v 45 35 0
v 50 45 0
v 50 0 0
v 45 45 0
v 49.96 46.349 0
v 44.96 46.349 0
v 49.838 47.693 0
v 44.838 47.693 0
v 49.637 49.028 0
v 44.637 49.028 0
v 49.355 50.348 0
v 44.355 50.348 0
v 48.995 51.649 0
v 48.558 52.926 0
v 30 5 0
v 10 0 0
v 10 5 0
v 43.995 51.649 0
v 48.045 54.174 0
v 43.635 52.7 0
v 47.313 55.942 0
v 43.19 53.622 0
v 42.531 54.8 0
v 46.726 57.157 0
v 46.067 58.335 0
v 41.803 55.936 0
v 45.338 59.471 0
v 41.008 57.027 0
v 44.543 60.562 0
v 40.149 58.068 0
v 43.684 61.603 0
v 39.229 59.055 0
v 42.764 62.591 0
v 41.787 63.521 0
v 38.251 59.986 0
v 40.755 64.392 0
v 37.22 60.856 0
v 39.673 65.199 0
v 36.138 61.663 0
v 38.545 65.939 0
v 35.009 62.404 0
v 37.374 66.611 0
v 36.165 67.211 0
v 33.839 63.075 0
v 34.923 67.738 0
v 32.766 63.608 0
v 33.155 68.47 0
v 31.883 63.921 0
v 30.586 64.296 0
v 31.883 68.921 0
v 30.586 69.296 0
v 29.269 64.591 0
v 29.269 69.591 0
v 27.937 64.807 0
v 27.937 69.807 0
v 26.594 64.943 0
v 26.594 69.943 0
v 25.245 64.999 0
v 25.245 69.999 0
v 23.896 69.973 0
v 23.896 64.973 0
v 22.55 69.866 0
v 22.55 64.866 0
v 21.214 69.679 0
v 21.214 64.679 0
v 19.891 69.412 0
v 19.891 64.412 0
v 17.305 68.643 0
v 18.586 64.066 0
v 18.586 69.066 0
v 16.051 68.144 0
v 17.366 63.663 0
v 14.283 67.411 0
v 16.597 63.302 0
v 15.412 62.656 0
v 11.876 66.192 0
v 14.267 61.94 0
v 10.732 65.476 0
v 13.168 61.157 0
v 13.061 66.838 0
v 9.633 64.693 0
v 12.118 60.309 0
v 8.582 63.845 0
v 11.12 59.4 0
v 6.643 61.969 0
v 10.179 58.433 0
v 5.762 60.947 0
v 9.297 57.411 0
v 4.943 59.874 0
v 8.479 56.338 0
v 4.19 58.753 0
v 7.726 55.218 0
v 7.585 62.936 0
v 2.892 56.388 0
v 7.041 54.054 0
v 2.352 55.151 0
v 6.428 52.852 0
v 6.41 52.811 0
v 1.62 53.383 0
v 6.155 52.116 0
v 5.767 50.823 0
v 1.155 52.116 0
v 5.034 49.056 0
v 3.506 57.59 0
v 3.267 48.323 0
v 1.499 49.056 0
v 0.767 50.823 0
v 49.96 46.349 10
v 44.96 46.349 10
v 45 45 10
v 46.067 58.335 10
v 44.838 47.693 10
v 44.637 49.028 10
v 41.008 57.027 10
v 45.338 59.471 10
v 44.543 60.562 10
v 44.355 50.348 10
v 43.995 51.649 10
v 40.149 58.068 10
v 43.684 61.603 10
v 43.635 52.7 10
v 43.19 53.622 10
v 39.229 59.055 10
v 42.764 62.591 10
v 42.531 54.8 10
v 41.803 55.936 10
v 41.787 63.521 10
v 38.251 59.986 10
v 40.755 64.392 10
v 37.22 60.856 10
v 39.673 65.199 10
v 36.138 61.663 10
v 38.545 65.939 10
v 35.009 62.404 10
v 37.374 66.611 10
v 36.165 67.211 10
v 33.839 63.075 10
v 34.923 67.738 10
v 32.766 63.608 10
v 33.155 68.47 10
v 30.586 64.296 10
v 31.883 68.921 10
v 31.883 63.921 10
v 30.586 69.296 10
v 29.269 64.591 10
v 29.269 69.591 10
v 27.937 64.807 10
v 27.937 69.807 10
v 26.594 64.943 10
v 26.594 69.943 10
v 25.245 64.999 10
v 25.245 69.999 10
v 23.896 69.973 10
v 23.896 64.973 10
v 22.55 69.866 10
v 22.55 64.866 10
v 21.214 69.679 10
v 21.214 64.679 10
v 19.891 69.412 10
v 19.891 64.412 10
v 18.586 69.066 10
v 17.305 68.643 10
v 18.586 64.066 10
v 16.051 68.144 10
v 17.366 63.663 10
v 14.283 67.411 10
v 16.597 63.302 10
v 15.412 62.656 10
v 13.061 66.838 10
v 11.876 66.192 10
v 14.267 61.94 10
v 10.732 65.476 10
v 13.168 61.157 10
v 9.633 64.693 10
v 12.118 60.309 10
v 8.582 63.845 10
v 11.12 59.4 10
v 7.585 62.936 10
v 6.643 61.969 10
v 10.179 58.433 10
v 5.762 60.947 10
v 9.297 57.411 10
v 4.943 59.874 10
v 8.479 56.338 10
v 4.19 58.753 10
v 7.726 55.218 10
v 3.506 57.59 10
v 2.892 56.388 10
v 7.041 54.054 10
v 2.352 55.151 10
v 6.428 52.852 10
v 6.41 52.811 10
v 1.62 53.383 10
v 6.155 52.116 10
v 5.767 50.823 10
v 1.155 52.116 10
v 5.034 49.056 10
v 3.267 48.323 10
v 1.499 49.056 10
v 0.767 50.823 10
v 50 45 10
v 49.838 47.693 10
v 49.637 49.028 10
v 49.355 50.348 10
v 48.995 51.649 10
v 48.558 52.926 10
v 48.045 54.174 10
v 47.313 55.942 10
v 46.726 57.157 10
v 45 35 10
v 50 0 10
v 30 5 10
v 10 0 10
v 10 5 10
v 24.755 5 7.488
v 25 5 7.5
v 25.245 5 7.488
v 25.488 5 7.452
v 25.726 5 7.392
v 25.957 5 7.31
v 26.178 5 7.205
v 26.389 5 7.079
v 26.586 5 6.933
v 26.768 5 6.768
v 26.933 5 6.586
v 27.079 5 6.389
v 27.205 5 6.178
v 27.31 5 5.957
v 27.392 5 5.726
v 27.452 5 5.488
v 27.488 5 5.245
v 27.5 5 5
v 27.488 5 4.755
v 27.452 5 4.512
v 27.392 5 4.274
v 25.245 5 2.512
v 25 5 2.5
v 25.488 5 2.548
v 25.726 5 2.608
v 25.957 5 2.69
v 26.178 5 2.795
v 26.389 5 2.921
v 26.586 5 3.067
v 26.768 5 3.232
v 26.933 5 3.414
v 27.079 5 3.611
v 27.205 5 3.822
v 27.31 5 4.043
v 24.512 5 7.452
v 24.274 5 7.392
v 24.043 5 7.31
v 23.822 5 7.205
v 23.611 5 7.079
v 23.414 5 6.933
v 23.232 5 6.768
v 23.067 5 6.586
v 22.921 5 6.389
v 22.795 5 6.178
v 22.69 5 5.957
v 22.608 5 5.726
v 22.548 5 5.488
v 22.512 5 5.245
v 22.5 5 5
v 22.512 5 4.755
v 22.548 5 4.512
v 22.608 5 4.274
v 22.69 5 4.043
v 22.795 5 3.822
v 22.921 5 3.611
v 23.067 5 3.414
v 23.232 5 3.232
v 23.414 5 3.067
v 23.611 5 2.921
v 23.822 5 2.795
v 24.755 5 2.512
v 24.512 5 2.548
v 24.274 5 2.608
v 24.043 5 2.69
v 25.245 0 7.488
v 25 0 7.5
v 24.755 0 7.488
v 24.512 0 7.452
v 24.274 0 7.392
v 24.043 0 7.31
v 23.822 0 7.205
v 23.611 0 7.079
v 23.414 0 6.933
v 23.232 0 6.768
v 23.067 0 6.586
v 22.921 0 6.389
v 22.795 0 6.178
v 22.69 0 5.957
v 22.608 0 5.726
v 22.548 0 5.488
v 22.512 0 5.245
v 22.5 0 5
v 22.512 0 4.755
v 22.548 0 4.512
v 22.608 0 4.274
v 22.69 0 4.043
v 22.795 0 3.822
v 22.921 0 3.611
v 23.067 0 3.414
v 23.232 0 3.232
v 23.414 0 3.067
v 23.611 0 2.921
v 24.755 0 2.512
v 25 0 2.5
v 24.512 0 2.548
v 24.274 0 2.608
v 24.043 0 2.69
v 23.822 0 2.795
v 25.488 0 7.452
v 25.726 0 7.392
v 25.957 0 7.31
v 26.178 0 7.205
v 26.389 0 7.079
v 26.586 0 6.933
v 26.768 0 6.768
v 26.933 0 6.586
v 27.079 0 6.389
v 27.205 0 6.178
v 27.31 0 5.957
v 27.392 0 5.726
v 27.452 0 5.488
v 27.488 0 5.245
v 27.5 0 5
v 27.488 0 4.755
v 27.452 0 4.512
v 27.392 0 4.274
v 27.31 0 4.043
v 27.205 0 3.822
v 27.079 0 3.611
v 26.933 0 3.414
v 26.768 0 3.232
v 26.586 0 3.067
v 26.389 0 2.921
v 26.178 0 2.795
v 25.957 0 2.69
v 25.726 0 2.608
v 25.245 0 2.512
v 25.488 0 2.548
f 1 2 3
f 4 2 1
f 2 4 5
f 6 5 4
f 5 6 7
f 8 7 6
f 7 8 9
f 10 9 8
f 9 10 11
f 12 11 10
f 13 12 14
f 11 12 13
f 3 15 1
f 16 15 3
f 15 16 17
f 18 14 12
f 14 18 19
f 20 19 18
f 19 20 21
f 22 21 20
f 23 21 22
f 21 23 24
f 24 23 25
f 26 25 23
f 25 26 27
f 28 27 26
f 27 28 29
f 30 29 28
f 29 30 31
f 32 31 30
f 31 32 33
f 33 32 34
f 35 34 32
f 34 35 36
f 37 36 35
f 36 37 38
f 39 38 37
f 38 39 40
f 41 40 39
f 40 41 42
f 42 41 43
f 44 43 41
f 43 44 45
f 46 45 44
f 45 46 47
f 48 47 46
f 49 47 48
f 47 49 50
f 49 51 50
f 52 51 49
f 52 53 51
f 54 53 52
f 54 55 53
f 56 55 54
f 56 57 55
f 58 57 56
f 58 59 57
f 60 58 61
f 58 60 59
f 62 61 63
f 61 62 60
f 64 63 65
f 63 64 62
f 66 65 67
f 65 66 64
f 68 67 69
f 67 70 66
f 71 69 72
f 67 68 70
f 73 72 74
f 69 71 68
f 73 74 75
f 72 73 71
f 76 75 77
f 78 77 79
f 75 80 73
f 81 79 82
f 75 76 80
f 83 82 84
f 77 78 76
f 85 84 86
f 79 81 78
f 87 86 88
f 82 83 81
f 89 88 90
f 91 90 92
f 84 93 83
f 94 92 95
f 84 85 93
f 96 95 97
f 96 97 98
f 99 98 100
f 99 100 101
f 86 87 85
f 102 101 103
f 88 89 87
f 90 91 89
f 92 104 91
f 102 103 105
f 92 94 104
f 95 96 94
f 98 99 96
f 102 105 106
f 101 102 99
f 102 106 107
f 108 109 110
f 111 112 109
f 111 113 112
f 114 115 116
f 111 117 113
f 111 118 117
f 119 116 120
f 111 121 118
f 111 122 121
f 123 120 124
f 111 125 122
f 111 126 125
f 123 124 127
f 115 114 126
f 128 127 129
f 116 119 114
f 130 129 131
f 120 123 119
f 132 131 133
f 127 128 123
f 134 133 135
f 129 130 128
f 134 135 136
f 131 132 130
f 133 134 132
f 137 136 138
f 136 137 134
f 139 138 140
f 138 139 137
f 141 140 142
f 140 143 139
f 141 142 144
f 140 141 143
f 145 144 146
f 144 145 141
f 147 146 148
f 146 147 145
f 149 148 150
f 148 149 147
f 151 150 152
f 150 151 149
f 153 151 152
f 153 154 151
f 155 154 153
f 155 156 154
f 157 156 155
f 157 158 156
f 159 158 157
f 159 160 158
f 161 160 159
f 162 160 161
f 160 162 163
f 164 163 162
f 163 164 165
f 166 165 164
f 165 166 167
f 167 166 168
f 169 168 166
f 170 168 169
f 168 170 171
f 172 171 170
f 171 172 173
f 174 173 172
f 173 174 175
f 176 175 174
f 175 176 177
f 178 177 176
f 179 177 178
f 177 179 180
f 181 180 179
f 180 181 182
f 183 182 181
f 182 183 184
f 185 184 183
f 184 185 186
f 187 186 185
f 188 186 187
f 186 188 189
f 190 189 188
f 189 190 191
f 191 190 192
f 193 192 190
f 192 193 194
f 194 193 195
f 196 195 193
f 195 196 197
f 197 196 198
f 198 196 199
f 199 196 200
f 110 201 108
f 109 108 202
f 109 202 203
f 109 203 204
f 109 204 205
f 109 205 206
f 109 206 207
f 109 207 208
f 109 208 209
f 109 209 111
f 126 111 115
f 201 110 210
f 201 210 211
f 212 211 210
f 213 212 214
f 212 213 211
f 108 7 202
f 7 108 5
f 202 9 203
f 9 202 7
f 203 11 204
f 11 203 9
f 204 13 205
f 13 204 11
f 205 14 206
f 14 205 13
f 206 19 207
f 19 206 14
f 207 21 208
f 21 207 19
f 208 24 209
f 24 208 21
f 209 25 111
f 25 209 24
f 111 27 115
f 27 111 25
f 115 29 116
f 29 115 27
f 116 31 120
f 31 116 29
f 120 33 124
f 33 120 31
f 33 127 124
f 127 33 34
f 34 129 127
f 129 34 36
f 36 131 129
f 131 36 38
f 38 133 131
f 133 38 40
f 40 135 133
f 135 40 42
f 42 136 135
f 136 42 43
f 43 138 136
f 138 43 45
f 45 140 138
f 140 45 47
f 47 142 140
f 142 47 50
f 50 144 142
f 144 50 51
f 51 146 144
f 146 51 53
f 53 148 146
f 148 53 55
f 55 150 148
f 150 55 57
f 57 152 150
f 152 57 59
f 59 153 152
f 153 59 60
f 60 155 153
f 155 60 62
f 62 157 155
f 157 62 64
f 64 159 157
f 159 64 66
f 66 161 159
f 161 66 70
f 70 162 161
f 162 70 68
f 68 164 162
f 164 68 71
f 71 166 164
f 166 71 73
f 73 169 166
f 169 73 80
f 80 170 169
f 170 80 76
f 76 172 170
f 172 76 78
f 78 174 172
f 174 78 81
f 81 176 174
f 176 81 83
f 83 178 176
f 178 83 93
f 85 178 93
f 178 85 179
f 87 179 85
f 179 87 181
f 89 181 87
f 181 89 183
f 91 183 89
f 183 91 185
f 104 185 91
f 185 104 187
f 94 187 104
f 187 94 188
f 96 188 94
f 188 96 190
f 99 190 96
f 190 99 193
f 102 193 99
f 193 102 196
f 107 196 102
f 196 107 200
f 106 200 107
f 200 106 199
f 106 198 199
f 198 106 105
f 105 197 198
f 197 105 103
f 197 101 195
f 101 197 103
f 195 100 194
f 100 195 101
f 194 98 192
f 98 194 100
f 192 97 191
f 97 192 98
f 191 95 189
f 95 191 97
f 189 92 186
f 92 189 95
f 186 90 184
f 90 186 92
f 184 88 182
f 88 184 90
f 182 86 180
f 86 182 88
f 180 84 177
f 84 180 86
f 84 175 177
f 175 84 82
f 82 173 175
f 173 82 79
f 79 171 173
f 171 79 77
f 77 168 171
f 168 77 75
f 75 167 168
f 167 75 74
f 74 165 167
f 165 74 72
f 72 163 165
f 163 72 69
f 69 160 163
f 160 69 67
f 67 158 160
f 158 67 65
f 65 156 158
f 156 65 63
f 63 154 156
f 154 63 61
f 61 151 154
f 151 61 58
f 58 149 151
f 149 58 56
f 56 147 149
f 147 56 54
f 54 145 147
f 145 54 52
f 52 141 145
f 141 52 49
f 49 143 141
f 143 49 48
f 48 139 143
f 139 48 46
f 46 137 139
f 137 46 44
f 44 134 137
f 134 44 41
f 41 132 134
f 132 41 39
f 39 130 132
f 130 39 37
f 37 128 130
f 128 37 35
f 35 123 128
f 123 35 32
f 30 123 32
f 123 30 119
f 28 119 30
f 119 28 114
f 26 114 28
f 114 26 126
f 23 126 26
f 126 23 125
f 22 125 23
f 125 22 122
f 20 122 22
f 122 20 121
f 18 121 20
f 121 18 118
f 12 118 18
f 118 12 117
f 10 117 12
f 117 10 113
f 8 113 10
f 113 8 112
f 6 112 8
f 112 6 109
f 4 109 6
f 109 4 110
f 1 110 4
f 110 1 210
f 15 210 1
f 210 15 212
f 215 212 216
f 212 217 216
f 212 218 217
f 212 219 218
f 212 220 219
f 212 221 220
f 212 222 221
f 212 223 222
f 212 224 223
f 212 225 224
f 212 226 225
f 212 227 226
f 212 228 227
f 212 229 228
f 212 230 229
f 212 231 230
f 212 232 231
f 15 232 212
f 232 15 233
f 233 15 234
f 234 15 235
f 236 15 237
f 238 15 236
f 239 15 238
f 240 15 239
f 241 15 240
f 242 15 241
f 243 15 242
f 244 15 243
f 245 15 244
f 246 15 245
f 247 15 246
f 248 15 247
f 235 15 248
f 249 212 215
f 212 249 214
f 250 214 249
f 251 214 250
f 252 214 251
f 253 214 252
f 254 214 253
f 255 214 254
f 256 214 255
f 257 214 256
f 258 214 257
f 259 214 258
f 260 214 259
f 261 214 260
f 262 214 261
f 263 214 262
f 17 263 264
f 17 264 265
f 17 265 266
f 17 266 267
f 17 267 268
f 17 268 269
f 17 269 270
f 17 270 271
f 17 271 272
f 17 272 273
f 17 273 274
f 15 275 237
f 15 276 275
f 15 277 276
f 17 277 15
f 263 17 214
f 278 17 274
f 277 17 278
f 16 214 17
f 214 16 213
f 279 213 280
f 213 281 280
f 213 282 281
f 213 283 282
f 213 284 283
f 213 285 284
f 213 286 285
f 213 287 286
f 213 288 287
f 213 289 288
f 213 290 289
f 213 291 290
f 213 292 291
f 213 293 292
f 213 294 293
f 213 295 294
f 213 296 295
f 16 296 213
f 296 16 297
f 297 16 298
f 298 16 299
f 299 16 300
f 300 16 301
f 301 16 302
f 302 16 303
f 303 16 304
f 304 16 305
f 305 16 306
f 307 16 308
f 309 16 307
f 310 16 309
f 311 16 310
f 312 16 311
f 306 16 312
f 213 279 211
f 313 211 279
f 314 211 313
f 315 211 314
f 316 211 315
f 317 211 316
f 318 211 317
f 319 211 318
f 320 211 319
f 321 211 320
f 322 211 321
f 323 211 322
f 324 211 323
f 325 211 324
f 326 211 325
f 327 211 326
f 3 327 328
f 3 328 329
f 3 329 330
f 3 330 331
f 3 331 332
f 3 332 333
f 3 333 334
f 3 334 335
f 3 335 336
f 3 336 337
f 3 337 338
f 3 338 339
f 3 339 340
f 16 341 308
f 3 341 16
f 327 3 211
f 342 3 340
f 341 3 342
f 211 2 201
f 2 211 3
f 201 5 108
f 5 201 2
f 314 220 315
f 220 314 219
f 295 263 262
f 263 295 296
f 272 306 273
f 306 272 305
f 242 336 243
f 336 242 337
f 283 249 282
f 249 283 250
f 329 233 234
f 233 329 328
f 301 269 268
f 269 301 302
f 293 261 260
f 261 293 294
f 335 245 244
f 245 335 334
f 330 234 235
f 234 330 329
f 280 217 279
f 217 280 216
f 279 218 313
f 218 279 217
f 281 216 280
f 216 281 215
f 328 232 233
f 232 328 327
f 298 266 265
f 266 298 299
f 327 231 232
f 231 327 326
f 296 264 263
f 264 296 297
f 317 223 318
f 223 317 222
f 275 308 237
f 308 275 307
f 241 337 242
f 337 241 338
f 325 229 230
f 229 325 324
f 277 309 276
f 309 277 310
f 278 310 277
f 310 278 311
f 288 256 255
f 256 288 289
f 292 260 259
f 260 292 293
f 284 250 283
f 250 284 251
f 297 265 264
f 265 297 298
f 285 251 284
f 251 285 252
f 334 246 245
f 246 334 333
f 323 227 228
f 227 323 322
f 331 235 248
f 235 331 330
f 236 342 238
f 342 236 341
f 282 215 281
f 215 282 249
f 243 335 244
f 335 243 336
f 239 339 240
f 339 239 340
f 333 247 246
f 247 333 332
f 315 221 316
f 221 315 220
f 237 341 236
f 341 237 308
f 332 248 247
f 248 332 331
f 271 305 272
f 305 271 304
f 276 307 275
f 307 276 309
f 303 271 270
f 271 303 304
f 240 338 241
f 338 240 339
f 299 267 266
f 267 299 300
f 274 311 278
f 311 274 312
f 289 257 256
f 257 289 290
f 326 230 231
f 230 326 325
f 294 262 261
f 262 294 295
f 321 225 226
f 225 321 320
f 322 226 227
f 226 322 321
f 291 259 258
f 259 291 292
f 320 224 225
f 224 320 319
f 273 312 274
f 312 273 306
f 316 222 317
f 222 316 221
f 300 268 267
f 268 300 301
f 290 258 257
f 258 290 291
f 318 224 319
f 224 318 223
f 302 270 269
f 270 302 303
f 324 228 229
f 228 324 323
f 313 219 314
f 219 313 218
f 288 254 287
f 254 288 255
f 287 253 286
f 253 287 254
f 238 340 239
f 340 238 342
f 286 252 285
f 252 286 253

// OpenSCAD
// Ceiling hook — parametric arch hook.
//
// Shape (side profile, extruded plate_width_mm in Y):
//
//         ╭────╮
//        ╱      ╲   ← half-circle arch
//       │        │
//  post │        │ post
//  ─────┴────────┴─── plate
//
// Two posts rise from each end of the plate.
// A perfect semicircle arch connects the top of the left post to the
// top of the right post, arching upward over the centre.
// Screw hole goes through the plate thickness (Z) at the plate centre.

$fn = 64;

// ── Parameters ───────────────────────────────────────────────────────────────
plate_length_mm = 50;
plate_width_mm  =  10;   // extrusion depth (Y)
plate_thick_mm  =  5;
post_height_mm  = 40;   // height of each post above the plate top surface
arch_thick_mm   =  5;   // cross-section of the arch arm

screw_dia_mm    =  5; // clearance hole through plate width (Y, left→right)
gusset_mm       = 15;   // leg length of the 45° gusset triangle at each post base

// ── Arch geometry ─────────────────────────────────────────────────────────────
// Arch centreline endpoints = centres of the two post top edges:
//   Left  post top centre: (plate_thick/2,              plate_thick + post_height)
//   Right post top centre: (plate_length - plate_thick/2, plate_thick + post_height)
//
// A perfect semicircle (180°) sits above those two points.

arch_cx = plate_length_mm / 2;                        // midpoint of the span
arch_cy = plate_thick_mm + post_height_mm;            // height of post tops
arch_r  = (plate_length_mm - plate_thick_mm) / 2;    // = half the inner span
// Arc goes from 180° (left post top) counterclockwise through 90° (crown)
// to 0° (right post top).
a_start = 165;
a_end   =   0;

echo(str("Arch: centre=(", arch_cx, ",", arch_cy, ")  R=", arch_r, " mm"));
echo(str("Crown height: ", arch_cy + arch_r, " mm above print bed"));

// ── 2D arc tube — hull of consecutive discs along the arc centreline ──────────
module arc_tube_2d(cx, cy, R, a1, a2, thick, steps = 48) {
    r = thick / 2;
    for (i = [0 : steps - 1]) {
        a  = a1 + i       * (a2 - a1) / steps;
        an = a1 + (i + 1) * (a2 - a1) / steps;
        hull() {
            translate([cx + R*cos(a),  cy + R*sin(a)])  circle(r = r, $fn = 8);
            translate([cx + R*cos(an), cy + R*sin(an)]) circle(r = r, $fn = 8);
        }
    }
}

// ── 2D side profile (X = plate length, Y = height) ───────────────────────────
module hook_profile_2d() {
    union() {
        // Plate — left 1/5 cropped (open/no-post side)
        translate([plate_length_mm / 5, 0])
            square([plate_length_mm * 4 / 5, plate_thick_mm]);

        // Left post
        //square([plate_thick_mm, plate_thick_mm + post_height_mm]);

        // Right post
        translate([plate_length_mm - plate_thick_mm, 0])
            square([plate_thick_mm, plate_thick_mm + post_height_mm]);

        // 45° gusset — inner corner of right post / plate junction
        translate([plate_length_mm - plate_thick_mm, plate_thick_mm])
            polygon([[0, 0],
                     [-gusset_mm, 0],
                     [0, gusset_mm+15]]);

        // Semicircle arch
        arc_tube_2d(arch_cx, arch_cy, arch_r, a_start, a_end, arch_thick_mm);
    }
}

// ── 3D model ──────────────────────────────────────────────────────────────────
difference() {
    linear_extrude(height = plate_width_mm, convexity = 6)
        hook_profile_2d();

    // Screw clearance hole through the plate width (Y, left→right), centred on
    // the plate length, thickness, and width.
    translate([plate_length_mm / 2, plate_width_mm / 2, plate_width_mm / 2 ])
        rotate([-90, 0, 0])
            cylinder(d = screw_dia_mm, h = plate_width_mm + 0.02, center = true);
}
